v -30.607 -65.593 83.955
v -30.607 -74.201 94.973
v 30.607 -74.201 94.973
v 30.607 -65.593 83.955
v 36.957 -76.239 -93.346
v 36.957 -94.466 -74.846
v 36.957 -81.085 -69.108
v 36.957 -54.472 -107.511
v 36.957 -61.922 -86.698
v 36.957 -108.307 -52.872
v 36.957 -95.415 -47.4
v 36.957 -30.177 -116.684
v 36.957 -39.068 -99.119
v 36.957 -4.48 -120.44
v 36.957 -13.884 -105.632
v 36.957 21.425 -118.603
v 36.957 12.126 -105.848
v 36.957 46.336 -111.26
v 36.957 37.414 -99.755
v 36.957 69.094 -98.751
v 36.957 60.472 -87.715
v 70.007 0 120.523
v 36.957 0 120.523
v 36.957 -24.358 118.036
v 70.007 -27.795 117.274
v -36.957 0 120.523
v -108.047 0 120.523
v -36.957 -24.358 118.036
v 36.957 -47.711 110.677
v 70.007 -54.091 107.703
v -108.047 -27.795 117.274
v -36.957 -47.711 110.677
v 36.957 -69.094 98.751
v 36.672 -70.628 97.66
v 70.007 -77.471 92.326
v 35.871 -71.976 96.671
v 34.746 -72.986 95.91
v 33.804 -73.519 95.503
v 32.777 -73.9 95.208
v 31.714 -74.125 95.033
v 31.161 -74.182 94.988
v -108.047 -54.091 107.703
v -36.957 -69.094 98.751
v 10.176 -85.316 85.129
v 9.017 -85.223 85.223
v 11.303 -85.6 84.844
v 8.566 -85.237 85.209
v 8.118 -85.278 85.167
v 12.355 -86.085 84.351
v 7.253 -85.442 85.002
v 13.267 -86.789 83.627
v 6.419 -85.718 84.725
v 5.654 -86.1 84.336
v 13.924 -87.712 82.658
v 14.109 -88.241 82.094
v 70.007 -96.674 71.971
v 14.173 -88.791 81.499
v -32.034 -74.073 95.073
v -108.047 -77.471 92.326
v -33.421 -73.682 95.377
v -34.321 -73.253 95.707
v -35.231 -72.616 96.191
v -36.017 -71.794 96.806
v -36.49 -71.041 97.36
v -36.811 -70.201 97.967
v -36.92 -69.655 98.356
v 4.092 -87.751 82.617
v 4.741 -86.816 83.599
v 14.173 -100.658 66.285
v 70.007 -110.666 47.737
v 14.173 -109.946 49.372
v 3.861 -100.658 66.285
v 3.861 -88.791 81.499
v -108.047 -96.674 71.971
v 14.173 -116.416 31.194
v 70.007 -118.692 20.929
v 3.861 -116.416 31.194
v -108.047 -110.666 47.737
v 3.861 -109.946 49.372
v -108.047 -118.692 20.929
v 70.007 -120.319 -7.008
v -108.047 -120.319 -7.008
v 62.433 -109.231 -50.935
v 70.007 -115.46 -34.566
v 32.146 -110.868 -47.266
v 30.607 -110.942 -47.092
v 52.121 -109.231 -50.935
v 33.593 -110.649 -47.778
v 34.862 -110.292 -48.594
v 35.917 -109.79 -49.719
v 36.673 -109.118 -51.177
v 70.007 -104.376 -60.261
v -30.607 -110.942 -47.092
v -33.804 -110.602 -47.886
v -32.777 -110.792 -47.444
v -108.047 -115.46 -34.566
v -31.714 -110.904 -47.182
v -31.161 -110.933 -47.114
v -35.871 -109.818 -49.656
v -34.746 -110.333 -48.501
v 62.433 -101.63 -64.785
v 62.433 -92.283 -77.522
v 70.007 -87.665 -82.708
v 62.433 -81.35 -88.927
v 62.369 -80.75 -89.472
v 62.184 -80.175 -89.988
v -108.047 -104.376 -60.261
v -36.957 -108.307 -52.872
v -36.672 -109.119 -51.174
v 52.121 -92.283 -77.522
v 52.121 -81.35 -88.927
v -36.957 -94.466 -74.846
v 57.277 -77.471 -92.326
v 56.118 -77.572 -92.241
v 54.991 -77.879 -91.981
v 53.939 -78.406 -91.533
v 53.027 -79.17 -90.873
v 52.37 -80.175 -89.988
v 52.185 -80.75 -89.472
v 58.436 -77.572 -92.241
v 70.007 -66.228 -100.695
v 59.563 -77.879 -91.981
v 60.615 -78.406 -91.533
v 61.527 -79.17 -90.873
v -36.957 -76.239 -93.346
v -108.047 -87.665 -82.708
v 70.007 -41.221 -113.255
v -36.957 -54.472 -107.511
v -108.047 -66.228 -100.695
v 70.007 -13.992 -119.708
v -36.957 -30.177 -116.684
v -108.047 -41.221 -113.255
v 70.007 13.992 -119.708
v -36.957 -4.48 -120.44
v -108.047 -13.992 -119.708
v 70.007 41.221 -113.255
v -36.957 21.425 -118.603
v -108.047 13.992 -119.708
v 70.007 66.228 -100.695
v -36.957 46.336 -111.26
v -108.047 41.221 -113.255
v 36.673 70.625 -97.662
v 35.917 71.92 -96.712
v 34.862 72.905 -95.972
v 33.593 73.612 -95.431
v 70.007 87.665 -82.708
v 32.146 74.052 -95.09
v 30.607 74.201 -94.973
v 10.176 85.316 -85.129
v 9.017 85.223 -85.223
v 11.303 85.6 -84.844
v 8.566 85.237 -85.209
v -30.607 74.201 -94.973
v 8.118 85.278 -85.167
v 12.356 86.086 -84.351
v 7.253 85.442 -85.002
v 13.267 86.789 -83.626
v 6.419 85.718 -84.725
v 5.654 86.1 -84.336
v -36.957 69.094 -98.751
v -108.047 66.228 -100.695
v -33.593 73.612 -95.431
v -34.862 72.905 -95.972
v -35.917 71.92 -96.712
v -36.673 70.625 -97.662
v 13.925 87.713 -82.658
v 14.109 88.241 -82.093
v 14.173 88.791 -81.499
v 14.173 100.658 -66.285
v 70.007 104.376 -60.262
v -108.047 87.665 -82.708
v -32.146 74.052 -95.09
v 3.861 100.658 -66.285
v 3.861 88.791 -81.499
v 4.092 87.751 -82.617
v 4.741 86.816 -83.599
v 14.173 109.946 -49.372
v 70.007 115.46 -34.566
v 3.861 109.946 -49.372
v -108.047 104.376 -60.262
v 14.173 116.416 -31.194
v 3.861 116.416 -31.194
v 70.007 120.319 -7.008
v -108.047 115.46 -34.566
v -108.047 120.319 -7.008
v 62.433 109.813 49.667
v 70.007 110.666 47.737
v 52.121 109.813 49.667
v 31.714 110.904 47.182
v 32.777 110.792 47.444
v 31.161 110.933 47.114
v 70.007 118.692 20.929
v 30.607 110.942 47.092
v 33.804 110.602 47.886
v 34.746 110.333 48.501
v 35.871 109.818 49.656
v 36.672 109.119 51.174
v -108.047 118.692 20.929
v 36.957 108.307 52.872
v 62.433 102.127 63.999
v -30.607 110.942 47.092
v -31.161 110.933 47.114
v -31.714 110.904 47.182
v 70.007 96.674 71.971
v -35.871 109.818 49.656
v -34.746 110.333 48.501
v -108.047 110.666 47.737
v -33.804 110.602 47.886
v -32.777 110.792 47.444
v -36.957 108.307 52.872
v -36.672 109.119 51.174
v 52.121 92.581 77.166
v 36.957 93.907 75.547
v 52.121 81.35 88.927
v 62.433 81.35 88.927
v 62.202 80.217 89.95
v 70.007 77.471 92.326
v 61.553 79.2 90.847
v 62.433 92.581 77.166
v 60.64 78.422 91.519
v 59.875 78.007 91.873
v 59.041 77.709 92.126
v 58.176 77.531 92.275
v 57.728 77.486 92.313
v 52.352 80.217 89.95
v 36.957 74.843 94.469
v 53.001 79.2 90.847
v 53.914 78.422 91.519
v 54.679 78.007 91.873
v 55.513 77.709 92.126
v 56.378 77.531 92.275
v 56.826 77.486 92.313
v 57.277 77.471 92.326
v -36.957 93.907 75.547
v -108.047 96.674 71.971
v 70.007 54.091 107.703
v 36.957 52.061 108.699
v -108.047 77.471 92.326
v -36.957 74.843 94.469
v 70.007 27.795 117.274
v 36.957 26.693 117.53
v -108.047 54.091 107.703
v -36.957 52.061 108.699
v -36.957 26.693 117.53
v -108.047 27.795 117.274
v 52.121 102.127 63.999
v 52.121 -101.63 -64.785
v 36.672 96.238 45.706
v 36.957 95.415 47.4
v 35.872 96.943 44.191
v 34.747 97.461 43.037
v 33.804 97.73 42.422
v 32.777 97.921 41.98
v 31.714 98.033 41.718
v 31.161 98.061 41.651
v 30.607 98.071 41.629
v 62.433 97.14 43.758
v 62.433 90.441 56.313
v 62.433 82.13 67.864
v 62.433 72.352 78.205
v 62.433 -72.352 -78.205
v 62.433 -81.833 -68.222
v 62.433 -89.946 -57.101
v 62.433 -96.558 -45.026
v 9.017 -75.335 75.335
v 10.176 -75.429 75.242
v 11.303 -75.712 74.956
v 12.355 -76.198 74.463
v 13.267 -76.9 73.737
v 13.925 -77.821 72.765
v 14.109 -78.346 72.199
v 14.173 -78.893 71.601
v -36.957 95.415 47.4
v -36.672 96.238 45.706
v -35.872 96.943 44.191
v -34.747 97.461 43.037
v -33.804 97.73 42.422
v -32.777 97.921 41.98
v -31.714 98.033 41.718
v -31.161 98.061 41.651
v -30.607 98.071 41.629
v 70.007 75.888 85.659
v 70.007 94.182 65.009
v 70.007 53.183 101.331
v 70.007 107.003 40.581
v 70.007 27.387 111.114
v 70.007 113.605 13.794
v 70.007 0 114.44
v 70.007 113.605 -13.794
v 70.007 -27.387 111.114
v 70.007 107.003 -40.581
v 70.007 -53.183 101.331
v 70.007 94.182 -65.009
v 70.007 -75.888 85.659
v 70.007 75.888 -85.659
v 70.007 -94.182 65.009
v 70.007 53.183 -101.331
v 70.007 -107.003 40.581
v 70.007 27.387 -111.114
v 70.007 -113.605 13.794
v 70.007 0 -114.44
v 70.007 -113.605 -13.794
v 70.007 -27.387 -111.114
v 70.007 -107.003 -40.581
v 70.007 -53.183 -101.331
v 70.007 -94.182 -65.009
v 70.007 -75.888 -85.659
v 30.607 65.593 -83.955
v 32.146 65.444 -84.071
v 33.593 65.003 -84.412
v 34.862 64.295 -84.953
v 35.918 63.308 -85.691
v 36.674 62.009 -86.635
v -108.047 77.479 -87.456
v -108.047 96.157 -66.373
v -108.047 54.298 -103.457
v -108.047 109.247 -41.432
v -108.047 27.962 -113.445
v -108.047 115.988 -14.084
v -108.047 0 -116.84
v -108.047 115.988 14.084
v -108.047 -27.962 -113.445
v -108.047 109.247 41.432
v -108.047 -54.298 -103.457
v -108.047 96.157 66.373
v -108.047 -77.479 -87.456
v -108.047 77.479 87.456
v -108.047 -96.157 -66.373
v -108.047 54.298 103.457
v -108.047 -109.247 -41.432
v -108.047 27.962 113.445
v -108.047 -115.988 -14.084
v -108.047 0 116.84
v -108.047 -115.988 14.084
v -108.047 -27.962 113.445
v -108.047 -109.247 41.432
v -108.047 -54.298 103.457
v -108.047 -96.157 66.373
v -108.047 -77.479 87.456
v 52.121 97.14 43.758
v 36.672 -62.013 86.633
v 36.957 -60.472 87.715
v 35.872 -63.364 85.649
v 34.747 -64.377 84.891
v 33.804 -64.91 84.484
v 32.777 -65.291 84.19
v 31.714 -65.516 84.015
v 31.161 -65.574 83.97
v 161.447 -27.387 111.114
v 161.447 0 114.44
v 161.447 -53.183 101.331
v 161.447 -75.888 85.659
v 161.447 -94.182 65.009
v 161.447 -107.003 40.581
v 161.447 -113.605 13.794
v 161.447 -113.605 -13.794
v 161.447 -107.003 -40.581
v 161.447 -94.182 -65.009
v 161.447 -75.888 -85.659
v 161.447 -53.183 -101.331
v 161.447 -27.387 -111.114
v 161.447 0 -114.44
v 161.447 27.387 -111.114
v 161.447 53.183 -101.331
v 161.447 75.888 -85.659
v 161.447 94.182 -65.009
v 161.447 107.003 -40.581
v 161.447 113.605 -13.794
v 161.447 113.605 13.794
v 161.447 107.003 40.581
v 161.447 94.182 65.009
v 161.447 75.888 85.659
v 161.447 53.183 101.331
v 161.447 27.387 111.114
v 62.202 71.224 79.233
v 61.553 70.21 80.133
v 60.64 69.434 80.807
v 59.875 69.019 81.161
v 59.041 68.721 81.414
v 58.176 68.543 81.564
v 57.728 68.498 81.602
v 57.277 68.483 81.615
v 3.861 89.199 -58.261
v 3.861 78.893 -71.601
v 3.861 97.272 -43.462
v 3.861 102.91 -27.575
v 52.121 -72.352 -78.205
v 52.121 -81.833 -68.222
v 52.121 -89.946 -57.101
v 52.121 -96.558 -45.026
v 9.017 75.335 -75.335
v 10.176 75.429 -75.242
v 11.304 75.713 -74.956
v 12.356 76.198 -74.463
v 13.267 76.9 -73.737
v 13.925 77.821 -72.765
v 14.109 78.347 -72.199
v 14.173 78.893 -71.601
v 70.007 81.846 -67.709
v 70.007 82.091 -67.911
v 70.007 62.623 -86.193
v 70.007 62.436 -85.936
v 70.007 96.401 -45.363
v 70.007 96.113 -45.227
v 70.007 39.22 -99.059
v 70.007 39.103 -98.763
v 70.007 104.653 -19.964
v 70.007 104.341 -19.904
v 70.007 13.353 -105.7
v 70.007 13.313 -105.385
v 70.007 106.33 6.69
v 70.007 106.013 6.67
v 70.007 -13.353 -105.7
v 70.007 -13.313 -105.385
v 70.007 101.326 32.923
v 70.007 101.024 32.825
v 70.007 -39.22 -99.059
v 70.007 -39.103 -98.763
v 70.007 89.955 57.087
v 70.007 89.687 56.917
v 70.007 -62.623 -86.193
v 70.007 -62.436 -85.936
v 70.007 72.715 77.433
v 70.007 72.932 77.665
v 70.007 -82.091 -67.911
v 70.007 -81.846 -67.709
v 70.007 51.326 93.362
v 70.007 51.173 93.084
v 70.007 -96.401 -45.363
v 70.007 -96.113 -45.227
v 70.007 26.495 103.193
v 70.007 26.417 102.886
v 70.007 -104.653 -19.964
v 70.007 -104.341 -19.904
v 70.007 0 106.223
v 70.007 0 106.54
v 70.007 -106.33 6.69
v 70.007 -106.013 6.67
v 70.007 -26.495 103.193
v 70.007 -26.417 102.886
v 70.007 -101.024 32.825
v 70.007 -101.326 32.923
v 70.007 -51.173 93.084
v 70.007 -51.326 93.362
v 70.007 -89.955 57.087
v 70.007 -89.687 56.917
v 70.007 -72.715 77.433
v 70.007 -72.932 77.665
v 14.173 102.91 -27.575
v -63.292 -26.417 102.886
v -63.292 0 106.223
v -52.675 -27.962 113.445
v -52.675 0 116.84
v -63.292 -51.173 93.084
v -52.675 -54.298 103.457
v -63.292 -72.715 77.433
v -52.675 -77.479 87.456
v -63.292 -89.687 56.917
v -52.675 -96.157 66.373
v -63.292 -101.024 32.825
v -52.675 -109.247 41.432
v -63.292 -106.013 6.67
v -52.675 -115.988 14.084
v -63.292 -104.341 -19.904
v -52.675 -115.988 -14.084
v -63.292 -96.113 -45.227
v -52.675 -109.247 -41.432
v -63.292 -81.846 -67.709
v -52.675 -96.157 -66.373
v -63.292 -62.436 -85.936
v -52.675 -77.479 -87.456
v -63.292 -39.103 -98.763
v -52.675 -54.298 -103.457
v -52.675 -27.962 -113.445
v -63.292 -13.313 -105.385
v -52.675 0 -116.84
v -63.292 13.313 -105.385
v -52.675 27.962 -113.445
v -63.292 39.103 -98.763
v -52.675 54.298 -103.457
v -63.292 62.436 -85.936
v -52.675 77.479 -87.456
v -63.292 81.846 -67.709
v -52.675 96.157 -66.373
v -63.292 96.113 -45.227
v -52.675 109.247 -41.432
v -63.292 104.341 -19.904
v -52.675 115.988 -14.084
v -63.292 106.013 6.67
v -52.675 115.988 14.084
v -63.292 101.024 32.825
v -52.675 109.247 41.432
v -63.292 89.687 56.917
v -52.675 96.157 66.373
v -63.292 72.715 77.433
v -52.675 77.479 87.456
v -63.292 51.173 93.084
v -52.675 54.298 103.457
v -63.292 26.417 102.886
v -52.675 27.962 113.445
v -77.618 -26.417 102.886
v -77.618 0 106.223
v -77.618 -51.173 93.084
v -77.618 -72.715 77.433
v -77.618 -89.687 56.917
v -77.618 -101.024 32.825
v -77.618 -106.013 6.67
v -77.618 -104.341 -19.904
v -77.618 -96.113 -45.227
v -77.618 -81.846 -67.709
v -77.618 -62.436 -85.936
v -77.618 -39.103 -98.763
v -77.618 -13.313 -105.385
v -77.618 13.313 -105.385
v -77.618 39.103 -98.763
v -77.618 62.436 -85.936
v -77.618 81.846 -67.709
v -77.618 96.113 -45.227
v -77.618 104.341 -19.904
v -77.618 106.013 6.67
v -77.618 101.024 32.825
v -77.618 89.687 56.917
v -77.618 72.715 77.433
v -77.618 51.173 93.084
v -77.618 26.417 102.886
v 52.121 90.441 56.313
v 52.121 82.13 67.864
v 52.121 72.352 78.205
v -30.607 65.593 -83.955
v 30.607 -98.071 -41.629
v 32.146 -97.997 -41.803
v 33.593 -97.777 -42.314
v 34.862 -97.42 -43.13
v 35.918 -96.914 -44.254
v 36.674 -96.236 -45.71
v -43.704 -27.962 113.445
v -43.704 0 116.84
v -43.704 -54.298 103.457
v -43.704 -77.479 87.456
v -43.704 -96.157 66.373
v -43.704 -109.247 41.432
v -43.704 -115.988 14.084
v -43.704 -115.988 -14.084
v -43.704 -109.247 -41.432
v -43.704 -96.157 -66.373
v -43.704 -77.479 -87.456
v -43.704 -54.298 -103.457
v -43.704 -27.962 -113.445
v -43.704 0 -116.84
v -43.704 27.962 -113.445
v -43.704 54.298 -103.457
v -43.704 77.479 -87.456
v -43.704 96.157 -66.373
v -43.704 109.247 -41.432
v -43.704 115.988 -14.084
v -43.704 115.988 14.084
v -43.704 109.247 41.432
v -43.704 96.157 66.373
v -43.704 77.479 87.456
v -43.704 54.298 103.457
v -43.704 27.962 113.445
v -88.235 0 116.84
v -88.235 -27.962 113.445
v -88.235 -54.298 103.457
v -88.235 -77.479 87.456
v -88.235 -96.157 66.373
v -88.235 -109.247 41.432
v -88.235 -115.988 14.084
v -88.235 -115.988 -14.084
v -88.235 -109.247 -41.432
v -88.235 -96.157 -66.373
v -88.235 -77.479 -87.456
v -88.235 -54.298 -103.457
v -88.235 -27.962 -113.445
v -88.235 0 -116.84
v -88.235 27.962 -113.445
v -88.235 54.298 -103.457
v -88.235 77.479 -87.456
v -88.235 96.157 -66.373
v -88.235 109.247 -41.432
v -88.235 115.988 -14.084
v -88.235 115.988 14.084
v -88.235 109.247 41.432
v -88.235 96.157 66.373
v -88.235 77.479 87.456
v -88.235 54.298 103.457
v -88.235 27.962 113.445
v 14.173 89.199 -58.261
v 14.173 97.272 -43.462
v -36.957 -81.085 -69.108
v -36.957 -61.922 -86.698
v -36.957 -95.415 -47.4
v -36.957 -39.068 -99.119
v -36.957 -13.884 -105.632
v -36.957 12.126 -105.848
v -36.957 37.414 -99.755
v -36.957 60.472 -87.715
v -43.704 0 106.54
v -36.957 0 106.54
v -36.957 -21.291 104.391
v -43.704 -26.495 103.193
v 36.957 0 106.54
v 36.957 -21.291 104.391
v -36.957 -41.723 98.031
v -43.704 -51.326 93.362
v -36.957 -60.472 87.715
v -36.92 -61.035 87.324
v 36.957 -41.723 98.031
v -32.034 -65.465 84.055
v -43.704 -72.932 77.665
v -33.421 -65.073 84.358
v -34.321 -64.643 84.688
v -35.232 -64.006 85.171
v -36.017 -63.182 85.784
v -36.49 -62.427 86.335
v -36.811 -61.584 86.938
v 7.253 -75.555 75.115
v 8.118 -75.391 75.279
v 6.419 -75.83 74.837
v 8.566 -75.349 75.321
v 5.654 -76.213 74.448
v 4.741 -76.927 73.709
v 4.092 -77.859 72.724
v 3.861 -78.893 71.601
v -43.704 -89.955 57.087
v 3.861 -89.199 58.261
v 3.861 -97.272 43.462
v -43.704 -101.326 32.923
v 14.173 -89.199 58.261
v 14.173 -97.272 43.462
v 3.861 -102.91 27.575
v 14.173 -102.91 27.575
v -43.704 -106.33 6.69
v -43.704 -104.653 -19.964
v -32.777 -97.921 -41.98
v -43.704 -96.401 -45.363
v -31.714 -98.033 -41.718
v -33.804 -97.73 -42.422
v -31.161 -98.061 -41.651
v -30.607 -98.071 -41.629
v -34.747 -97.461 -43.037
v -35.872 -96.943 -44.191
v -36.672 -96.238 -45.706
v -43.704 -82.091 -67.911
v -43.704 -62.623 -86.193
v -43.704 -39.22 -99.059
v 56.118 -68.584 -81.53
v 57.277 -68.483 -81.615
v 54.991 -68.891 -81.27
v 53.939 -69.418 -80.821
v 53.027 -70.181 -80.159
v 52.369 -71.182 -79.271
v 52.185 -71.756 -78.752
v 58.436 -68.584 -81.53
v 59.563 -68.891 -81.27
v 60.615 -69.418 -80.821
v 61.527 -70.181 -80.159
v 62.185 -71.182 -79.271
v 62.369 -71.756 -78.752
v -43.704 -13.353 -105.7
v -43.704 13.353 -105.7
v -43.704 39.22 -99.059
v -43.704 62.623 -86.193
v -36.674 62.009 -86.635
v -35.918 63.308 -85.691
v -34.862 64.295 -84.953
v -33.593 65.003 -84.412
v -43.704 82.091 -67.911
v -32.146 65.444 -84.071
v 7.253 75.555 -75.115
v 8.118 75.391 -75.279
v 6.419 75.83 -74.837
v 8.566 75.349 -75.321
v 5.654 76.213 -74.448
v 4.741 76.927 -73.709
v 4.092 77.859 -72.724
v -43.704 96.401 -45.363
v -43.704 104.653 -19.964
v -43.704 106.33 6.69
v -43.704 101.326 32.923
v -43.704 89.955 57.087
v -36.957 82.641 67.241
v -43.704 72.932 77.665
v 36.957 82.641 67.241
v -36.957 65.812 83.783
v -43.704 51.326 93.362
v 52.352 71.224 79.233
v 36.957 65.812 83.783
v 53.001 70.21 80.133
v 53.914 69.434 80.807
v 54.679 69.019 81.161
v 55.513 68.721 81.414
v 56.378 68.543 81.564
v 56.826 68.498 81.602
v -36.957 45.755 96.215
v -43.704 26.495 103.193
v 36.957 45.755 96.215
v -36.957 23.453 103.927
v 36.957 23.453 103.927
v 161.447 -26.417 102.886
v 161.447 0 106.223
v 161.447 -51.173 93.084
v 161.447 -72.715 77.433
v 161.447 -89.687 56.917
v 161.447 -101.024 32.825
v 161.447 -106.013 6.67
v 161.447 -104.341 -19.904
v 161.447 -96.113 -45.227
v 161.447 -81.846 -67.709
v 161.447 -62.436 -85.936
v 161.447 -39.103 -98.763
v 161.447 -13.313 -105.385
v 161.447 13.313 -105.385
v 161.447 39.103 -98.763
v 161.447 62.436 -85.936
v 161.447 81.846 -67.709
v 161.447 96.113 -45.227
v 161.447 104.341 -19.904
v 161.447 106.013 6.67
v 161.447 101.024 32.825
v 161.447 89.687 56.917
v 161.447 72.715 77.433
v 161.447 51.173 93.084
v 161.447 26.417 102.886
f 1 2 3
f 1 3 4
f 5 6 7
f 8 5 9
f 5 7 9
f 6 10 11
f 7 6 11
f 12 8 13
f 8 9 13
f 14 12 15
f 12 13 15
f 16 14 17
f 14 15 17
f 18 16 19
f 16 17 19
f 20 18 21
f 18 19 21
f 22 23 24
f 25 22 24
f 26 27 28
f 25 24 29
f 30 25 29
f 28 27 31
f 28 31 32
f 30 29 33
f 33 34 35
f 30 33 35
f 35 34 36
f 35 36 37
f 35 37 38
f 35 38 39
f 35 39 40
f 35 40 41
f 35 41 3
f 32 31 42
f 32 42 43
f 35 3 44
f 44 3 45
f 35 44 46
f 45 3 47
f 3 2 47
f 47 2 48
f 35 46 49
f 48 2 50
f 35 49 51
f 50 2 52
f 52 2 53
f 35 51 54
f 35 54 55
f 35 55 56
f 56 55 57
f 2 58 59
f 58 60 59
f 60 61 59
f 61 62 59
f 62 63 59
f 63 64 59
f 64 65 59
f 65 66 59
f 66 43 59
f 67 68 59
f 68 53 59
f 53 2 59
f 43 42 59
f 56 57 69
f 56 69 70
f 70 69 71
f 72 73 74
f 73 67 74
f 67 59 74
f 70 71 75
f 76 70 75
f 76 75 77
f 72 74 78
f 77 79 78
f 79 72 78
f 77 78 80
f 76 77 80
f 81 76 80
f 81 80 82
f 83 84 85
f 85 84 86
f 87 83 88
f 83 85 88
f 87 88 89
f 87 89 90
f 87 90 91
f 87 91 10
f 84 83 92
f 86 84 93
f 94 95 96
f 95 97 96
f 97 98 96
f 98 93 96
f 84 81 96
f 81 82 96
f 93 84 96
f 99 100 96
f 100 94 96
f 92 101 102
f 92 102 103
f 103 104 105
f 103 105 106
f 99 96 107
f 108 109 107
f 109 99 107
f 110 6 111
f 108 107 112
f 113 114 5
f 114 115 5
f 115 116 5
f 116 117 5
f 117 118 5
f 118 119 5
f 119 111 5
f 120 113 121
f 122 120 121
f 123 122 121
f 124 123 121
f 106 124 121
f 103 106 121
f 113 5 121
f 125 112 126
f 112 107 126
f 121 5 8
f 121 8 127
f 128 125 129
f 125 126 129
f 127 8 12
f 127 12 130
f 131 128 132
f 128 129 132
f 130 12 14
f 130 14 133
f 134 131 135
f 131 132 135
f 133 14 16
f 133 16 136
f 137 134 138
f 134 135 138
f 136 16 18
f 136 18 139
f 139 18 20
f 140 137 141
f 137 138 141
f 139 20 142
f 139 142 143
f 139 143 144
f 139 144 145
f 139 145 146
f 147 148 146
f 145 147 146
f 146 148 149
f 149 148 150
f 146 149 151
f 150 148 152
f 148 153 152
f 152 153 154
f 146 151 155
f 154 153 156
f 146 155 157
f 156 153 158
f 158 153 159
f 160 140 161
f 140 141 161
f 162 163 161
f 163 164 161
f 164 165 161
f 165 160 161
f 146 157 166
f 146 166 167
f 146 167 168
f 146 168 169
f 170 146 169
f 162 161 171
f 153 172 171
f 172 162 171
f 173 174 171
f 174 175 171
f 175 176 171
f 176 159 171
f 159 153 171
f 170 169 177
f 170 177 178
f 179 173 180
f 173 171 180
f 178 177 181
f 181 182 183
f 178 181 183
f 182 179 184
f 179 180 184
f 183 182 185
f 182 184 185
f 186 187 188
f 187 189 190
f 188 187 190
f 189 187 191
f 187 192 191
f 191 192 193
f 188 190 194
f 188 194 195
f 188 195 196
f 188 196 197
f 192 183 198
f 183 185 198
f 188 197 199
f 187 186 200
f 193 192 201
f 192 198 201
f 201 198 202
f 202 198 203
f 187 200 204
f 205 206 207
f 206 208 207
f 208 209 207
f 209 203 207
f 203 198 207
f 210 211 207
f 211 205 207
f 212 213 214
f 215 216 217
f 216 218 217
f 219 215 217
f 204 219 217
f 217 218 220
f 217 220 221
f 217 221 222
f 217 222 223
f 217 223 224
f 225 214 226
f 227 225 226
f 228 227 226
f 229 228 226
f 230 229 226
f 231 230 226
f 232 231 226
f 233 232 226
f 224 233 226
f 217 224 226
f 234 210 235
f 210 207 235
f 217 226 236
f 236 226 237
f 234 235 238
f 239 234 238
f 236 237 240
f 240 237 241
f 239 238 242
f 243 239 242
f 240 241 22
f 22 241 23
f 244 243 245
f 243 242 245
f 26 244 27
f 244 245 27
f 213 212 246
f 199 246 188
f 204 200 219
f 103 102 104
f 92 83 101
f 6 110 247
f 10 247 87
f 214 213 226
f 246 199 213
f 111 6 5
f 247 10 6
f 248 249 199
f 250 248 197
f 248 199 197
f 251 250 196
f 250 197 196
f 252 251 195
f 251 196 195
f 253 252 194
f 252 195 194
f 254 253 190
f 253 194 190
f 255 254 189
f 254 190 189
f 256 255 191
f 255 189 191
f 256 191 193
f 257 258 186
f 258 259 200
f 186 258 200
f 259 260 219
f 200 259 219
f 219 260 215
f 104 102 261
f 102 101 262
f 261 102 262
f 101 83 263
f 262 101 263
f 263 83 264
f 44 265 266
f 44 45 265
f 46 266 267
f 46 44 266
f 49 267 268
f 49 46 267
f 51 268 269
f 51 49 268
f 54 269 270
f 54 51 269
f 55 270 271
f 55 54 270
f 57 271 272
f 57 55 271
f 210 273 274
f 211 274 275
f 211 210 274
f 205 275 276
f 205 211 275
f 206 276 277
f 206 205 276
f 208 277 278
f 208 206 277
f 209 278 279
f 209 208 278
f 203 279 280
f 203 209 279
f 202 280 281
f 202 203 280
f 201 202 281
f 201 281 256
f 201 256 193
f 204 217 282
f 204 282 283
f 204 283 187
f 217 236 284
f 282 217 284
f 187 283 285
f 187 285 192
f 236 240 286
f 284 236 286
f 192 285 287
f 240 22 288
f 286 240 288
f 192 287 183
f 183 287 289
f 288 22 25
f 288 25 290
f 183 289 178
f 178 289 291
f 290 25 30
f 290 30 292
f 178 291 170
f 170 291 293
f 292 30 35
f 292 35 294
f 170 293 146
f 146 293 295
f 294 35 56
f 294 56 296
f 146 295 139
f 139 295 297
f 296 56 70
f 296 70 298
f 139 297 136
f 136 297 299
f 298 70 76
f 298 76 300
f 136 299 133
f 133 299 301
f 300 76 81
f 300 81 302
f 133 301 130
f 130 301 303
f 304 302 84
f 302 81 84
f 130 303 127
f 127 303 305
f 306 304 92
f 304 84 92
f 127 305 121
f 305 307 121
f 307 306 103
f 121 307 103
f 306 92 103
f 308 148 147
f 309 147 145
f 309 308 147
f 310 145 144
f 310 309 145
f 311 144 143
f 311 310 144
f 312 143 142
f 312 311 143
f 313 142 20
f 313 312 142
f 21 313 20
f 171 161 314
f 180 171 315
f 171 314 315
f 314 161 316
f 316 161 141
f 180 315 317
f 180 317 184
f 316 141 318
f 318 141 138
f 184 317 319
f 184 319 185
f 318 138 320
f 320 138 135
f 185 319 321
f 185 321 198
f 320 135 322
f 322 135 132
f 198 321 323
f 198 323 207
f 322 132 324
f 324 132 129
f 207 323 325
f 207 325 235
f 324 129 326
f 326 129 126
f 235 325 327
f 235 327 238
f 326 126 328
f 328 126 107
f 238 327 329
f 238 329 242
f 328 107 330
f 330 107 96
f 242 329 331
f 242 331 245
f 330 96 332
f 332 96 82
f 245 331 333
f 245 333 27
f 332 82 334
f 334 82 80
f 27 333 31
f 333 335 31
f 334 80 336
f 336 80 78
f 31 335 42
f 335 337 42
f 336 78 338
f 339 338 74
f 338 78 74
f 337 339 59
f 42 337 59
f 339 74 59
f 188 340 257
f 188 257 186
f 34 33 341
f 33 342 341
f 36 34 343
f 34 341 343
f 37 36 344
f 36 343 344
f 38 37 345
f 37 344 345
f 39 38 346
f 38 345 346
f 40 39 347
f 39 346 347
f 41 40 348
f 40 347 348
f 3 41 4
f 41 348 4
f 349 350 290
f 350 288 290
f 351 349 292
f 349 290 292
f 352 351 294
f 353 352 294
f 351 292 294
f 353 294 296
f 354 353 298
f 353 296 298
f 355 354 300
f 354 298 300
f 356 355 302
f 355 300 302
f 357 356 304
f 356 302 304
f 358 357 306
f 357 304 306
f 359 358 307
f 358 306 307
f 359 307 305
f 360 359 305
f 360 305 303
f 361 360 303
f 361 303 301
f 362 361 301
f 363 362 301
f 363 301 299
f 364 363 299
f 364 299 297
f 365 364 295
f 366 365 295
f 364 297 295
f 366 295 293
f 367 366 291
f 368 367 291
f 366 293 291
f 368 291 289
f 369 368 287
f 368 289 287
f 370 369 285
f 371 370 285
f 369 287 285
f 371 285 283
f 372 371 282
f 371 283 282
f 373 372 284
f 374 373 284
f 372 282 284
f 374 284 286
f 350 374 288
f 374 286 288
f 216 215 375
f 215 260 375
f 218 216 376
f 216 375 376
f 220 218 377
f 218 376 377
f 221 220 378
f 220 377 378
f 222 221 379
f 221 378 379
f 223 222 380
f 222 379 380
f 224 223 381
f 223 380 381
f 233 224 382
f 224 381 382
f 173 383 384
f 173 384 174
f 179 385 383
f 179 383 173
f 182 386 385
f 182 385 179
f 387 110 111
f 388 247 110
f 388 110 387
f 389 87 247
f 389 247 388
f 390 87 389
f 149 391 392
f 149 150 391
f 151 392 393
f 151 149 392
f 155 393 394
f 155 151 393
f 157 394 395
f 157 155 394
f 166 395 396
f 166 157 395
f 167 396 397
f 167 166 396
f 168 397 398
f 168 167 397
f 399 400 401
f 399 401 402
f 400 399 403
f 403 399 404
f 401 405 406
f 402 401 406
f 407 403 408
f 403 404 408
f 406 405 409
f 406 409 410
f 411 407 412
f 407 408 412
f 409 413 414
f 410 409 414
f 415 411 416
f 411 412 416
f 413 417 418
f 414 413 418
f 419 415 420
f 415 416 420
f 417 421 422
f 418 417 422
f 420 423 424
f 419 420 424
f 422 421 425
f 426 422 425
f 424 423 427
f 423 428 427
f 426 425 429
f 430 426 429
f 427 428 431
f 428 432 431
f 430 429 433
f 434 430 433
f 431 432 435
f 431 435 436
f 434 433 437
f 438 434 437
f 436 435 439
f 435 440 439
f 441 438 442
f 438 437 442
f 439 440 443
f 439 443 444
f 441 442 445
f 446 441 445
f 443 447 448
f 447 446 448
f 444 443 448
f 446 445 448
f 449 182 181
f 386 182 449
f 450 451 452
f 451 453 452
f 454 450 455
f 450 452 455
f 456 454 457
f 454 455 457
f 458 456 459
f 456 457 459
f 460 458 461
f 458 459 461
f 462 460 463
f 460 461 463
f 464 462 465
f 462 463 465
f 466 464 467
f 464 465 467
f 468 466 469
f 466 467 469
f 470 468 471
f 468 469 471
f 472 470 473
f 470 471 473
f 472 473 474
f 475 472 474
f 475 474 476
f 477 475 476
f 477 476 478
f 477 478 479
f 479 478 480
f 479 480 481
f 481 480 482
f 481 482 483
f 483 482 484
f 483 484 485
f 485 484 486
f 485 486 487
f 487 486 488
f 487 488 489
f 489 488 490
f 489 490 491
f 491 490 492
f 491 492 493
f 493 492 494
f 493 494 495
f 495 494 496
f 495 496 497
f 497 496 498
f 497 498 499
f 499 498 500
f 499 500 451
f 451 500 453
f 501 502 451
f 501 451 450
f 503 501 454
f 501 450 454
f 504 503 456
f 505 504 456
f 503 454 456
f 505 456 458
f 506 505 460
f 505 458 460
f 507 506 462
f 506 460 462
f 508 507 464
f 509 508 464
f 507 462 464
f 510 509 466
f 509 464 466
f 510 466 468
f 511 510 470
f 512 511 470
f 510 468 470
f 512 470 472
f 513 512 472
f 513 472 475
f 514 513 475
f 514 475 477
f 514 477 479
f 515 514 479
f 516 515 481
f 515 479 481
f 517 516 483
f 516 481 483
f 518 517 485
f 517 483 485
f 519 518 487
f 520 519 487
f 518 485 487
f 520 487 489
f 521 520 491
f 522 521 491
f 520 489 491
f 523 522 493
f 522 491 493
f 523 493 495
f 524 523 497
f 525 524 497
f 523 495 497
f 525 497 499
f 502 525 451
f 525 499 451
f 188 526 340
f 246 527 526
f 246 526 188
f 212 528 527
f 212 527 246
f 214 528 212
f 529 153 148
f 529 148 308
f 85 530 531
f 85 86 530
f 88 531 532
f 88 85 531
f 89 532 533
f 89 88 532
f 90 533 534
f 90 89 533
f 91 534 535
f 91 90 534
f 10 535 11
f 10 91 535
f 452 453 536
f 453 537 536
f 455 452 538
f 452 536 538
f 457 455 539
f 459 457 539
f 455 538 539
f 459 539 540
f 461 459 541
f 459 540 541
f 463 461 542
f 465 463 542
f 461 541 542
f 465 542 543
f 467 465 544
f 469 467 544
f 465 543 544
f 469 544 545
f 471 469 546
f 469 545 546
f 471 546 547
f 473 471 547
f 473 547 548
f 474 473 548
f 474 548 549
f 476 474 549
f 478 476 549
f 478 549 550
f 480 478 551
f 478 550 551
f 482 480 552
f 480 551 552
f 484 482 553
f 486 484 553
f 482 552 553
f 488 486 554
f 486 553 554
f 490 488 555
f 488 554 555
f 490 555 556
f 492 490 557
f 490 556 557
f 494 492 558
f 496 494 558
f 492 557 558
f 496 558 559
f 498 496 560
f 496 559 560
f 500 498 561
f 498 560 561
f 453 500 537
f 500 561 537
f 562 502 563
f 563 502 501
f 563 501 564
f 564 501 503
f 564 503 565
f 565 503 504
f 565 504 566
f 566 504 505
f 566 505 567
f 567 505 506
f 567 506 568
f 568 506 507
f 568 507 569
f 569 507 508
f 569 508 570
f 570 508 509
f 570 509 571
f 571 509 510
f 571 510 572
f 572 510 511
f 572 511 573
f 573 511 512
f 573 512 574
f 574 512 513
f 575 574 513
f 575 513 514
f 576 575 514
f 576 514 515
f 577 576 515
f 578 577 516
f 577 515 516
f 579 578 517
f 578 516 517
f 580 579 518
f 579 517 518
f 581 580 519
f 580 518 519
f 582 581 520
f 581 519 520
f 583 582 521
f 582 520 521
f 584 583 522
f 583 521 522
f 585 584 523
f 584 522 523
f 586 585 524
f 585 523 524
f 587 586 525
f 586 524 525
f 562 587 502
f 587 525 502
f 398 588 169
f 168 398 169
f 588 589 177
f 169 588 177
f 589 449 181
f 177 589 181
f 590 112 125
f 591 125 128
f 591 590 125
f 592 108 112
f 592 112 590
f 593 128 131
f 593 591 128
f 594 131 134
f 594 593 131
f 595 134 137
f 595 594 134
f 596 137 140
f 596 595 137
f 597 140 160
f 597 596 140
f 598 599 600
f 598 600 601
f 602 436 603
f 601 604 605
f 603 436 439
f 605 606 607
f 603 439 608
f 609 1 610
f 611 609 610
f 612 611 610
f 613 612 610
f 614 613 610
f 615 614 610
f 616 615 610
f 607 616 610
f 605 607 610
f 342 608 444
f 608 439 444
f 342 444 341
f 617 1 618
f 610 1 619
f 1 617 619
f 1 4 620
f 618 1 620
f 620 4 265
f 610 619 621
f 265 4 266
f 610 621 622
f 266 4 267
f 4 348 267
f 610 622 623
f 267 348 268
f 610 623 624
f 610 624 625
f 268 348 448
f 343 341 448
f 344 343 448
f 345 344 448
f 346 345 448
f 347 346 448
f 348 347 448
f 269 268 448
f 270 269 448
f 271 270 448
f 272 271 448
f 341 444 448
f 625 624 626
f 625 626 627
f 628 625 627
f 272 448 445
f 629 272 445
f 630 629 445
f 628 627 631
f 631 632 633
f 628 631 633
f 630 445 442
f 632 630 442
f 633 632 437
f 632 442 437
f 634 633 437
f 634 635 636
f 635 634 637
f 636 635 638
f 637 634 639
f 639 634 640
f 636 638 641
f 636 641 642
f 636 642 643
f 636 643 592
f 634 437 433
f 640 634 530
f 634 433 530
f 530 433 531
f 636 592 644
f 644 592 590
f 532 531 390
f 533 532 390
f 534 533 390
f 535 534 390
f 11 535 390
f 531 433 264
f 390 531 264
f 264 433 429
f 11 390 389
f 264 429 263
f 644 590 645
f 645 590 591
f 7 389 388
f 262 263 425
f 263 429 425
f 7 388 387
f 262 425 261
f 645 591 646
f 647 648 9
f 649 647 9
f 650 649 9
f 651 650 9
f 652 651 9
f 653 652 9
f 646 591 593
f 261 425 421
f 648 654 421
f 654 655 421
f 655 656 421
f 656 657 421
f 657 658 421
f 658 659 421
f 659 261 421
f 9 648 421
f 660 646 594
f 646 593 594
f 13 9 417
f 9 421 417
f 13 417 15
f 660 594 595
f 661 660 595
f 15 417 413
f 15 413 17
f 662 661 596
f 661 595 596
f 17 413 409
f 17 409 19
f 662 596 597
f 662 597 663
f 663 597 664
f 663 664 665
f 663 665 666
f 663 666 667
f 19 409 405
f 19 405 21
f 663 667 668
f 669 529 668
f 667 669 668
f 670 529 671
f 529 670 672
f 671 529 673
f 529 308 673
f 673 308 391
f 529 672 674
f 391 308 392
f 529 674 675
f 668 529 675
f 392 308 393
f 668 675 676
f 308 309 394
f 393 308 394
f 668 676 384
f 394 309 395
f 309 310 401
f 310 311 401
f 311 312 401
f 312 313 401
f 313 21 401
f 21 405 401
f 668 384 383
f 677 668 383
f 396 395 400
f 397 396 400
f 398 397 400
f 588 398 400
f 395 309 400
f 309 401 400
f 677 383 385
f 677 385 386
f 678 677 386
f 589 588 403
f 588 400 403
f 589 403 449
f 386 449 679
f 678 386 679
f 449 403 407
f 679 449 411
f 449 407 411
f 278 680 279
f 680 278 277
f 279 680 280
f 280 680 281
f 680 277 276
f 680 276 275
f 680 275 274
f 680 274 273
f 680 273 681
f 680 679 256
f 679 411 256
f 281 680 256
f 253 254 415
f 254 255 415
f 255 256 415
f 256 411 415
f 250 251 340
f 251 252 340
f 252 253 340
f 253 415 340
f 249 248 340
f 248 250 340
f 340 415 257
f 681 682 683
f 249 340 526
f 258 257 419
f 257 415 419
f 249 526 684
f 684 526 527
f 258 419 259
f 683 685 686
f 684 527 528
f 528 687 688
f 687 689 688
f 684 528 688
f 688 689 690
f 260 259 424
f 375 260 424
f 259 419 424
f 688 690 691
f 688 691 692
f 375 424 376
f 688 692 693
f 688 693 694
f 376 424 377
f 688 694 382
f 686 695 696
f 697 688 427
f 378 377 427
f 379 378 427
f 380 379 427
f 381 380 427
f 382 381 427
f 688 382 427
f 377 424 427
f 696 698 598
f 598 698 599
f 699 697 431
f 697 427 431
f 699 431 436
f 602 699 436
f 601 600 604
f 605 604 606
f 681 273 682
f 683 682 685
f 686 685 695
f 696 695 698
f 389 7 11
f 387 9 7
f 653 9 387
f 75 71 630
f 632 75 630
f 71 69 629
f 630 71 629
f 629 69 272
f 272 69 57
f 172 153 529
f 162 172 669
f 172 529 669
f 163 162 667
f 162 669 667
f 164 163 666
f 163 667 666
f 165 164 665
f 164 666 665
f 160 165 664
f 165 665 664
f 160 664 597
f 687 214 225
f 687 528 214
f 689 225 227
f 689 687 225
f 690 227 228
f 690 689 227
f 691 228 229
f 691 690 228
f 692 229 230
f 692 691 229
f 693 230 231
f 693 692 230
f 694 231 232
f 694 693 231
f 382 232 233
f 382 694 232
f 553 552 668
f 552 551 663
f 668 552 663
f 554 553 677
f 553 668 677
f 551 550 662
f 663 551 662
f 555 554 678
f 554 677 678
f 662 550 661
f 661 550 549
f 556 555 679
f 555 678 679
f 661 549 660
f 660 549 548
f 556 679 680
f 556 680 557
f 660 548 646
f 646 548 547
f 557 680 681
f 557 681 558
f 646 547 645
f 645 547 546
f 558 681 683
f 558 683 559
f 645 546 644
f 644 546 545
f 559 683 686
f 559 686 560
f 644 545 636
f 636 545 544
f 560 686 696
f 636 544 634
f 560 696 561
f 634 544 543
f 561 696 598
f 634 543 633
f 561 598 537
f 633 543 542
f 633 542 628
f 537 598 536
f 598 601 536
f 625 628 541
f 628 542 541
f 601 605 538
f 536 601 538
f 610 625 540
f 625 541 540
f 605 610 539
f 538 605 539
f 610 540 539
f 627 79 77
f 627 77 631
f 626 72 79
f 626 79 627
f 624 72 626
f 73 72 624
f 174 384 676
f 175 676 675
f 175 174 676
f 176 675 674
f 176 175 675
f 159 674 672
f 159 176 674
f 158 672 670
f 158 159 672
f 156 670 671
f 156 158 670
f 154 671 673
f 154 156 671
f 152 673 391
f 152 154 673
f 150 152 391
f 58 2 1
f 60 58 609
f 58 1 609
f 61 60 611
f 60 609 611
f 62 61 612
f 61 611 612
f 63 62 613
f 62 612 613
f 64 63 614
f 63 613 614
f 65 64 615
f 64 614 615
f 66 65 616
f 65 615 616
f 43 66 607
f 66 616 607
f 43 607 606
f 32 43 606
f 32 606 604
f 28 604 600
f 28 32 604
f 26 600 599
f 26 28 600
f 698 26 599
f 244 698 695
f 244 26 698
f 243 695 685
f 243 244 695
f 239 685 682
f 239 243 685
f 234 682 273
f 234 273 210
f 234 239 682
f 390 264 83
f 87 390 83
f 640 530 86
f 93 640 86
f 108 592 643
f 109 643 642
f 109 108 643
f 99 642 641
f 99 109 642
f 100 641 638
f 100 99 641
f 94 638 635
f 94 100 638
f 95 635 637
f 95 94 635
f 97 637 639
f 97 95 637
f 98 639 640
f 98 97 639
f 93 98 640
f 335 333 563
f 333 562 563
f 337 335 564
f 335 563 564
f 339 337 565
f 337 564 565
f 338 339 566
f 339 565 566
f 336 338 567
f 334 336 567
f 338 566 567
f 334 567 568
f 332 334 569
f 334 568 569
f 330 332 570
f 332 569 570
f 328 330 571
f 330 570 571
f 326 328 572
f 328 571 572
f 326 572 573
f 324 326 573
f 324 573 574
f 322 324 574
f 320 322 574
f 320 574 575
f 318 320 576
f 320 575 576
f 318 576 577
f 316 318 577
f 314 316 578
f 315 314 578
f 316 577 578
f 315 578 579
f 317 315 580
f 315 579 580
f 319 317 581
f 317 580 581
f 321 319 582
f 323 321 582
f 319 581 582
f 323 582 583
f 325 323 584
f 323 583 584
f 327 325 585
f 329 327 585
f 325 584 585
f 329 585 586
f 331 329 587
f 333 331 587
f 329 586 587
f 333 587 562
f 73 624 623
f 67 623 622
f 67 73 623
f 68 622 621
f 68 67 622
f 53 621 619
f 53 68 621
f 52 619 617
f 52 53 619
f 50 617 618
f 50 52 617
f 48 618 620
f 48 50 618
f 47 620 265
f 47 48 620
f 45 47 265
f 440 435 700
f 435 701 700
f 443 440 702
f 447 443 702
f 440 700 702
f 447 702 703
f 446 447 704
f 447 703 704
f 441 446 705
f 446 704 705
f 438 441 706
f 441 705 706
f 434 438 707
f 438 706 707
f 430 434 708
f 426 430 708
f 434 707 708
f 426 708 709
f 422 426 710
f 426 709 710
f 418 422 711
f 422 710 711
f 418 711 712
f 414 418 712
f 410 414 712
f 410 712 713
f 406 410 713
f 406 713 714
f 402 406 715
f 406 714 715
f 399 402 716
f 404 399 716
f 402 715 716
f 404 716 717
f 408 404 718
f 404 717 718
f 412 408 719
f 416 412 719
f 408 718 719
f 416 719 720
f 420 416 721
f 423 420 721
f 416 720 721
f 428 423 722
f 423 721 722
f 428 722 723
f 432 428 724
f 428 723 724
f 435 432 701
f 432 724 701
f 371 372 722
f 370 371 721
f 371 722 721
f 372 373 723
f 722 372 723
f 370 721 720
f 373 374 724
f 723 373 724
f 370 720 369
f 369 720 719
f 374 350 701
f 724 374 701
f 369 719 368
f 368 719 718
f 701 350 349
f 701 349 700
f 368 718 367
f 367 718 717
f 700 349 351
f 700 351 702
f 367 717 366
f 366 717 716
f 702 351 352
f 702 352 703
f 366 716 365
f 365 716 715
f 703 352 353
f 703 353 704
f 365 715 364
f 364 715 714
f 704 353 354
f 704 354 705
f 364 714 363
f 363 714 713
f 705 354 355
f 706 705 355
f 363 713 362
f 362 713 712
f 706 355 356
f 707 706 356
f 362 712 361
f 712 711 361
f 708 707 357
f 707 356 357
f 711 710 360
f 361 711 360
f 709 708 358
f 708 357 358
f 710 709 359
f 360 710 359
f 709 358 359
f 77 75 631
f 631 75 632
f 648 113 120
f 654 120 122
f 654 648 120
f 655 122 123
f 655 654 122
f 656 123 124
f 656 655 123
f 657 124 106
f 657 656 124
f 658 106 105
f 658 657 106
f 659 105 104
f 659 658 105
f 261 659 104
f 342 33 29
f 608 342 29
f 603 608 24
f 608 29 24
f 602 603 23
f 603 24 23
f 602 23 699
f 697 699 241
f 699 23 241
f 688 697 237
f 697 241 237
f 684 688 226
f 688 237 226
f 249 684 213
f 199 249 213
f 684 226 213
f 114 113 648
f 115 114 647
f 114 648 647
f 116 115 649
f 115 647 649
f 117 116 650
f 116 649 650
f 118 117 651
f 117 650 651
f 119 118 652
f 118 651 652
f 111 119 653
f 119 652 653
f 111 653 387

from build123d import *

# Parameters (mm, degrees)
F3_DEPTH  = 36.957
F4_R      = 6.35
F7_DEPTH  = 5.1562
F8_R      = 5.15619
F11_DEPTH = 5.1562
F12_R     = 5.15619


# Not quite as in the source:
# - a fillet or chamfer is up to 0.001 mm smaller than in the source, because OpenCascade refuses the exact size


with BuildPart() as f1:
    # F0 (on Front) → F1 (revolve)
    with BuildSketch(Plane.XZ):
        Polygon((-88.2352406061, 116.84), (-77.6180406061, 106.2228), (-63.2924406061, 106.2228), (-52.6752406061, 116.84), (-43.7044062913, 116.84), (-43.7044062913, 106.5403), (70.0067593939, 106.5403), (70.0067593939, 106.2228), (161.4467593939, 106.2228), (161.4467593939, 114.4397), (70.0067593939, 114.4397), (70.0067593939, 120.523), (-108.0472406061, 120.523), (-108.0472406061, 116.84), align=None)
    revolve(axis=Axis((26.6997593939, 0, 0), (1, 0, 0)))

    # F2 (on Right) → F3 (cut, symmetric)
    with BuildSketch(Plane.YZ):
        with BuildLine():
            Line((-79.5165483207, 101.776540644), (-60.0681501855, 76.8837261913))
            ThreePointArc((-60.0681501855, 76.8837261913), (24.428788043, 94.4591146185), (89.8107580216, 38.1224050048))
            Line((89.8107580216, 38.1224050048), (118.8889862246, 50.465380577))
            ThreePointArc((118.8889862246, 50.465380577), (32.3381508976, 125.0423515407), (-79.5165483207, 101.776540644))
        make_face()
        with BuildLine():
            ThreePointArc((60.0681501855, -76.8837261913), (-24.428788043, -94.4591146185), (-89.8107580216, -38.1224050048))
            Line((-89.8107580216, -38.1224050048), (-118.8889862246, -50.465380577))
            ThreePointArc((-118.8889862246, -50.465380577), (-32.3381508976, -125.0423515407), (79.5165483207, -101.776540644))
            Line((79.5165483207, -101.776540644), (60.0681501855, -76.8837261913))
        make_face()
    extrude(amount=F3_DEPTH, both=True, mode=Mode.SUBTRACT)

    # F4
    f4_edges = [f1.edges().sort_by_distance(p)[0] for p in [
        (36.957, -69.897063, 89.464161),
        (-36.957, -69.897063, 89.464161),
        (-36.957, 104.506435, 44.36035),
        (36.957, 104.506435, 44.36035),
        (36.957, -104.506435, -44.36035),
        (36.957, 69.897063, -89.464161),
        (-36.957, -104.506435, -44.36035),
        (-36.957, 69.897063, -89.464161),
    ]]
    fillet(f4_edges, radius=F4_R)

    # F6 (on offset) → F7 (cut, symmetric)
    with BuildSketch(Plane.YZ.offset(9.017)):
        with BuildLine():
            ThreePointArc((93.8788780653, -25.1547695639), (84.169499428, -48.5952831523), (68.7241085014, -68.7241085014))
            Line((68.7241085014, -68.7241085014), (90.3596269568, -90.3596269568))
            ThreePointArc((90.3596269568, -90.3596269568), (110.6674896962, -63.8939049666), (123.4335458995, -33.0739189427))
            Line((123.4335458995, -33.0739189427), (93.8788780653, -25.1547695639))
        make_face()
        with BuildLine():
            ThreePointArc((-92.7935106347, 24.8639462374), (-83.1963856114, 48.0334556284), (-67.9295643973, 67.9295643973))
            Line((-67.9295643973, 67.9295643973), (-89.4286909818, 89.4286909818))
            ThreePointArc((-89.4286909818, 89.4286909818), (-109.5273306353, 63.2356338259), (-122.1618637084, 32.7331727265))
            Line((-122.1618637084, 32.7331727265), (-92.7935106347, 24.8639462374))
        make_face()
    extrude(amount=F7_DEPTH, both=True, mode=Mode.SUBTRACT)

    # F8 (radius 5.1562 in the source; OpenCascade refuses exactly that, so slightly less here)
    f8_edges = [f1.edges().sort_by_distance(p)[0] for p in [
        (14.1732, 80.279, -80.279),
        (3.8608, 80.279, -80.279),
        (3.8608, -80.279, 80.279),
        (14.1732, -80.279, 80.279),
    ]]
    fillet(f8_edges, radius=F8_R)

    # F10 (on offset) → F11 (cut, symmetric)
    with BuildSketch(Plane.YZ.offset(57.277)):
        with BuildLine():
            ThreePointArc((64.781849813, 77.2040022495), (80.3789780557, 60.7977459719), (91.9209264172, 41.3241976951))
            Line((91.9209264172, 41.3241976951), (115.0678452351, 52.1177832026))
            ThreePointArc((115.0678452351, 52.1177832026), (100.6398977696, 76.3445041239), (81.1972614412, 96.7671280314))
            Line((81.1972614412, 96.7671280314), (64.781849813, 77.2040022495))
        make_face()
        with BuildLine():
            ThreePointArc((-62.1507050275, -74.0683259988), (-76.7088050422, -58.8607363245), (-87.6302951199, -40.8626777008))
            Line((-87.6302951199, -40.8626777008), (-116.6783232789, -54.4079956856))
            ThreePointArc((-116.6783232789, -54.4079956856), (-102.1365355533, -78.3721201887), (-82.7526604046, -98.6207803339))
            Line((-82.7526604046, -98.6207803339), (-62.1507050275, -74.0683259988))
        make_face()
    extrude(amount=F11_DEPTH, both=True, mode=Mode.SUBTRACT)

    # F12 (radius 5.1562 in the source; OpenCascade refuses exactly that, so slightly less here)
    f12_edges = [f1.edges().sort_by_distance(p)[0] for p in [
        (62.4332, 72.976738, 86.97029),
        (52.1208, 72.976738, 86.97029),
        (62.4332, -72.976738, -86.97029),
        (52.1208, -72.976738, -86.97029),
    ]]
    fillet(f12_edges, radius=F12_R)


solid = f1.part
